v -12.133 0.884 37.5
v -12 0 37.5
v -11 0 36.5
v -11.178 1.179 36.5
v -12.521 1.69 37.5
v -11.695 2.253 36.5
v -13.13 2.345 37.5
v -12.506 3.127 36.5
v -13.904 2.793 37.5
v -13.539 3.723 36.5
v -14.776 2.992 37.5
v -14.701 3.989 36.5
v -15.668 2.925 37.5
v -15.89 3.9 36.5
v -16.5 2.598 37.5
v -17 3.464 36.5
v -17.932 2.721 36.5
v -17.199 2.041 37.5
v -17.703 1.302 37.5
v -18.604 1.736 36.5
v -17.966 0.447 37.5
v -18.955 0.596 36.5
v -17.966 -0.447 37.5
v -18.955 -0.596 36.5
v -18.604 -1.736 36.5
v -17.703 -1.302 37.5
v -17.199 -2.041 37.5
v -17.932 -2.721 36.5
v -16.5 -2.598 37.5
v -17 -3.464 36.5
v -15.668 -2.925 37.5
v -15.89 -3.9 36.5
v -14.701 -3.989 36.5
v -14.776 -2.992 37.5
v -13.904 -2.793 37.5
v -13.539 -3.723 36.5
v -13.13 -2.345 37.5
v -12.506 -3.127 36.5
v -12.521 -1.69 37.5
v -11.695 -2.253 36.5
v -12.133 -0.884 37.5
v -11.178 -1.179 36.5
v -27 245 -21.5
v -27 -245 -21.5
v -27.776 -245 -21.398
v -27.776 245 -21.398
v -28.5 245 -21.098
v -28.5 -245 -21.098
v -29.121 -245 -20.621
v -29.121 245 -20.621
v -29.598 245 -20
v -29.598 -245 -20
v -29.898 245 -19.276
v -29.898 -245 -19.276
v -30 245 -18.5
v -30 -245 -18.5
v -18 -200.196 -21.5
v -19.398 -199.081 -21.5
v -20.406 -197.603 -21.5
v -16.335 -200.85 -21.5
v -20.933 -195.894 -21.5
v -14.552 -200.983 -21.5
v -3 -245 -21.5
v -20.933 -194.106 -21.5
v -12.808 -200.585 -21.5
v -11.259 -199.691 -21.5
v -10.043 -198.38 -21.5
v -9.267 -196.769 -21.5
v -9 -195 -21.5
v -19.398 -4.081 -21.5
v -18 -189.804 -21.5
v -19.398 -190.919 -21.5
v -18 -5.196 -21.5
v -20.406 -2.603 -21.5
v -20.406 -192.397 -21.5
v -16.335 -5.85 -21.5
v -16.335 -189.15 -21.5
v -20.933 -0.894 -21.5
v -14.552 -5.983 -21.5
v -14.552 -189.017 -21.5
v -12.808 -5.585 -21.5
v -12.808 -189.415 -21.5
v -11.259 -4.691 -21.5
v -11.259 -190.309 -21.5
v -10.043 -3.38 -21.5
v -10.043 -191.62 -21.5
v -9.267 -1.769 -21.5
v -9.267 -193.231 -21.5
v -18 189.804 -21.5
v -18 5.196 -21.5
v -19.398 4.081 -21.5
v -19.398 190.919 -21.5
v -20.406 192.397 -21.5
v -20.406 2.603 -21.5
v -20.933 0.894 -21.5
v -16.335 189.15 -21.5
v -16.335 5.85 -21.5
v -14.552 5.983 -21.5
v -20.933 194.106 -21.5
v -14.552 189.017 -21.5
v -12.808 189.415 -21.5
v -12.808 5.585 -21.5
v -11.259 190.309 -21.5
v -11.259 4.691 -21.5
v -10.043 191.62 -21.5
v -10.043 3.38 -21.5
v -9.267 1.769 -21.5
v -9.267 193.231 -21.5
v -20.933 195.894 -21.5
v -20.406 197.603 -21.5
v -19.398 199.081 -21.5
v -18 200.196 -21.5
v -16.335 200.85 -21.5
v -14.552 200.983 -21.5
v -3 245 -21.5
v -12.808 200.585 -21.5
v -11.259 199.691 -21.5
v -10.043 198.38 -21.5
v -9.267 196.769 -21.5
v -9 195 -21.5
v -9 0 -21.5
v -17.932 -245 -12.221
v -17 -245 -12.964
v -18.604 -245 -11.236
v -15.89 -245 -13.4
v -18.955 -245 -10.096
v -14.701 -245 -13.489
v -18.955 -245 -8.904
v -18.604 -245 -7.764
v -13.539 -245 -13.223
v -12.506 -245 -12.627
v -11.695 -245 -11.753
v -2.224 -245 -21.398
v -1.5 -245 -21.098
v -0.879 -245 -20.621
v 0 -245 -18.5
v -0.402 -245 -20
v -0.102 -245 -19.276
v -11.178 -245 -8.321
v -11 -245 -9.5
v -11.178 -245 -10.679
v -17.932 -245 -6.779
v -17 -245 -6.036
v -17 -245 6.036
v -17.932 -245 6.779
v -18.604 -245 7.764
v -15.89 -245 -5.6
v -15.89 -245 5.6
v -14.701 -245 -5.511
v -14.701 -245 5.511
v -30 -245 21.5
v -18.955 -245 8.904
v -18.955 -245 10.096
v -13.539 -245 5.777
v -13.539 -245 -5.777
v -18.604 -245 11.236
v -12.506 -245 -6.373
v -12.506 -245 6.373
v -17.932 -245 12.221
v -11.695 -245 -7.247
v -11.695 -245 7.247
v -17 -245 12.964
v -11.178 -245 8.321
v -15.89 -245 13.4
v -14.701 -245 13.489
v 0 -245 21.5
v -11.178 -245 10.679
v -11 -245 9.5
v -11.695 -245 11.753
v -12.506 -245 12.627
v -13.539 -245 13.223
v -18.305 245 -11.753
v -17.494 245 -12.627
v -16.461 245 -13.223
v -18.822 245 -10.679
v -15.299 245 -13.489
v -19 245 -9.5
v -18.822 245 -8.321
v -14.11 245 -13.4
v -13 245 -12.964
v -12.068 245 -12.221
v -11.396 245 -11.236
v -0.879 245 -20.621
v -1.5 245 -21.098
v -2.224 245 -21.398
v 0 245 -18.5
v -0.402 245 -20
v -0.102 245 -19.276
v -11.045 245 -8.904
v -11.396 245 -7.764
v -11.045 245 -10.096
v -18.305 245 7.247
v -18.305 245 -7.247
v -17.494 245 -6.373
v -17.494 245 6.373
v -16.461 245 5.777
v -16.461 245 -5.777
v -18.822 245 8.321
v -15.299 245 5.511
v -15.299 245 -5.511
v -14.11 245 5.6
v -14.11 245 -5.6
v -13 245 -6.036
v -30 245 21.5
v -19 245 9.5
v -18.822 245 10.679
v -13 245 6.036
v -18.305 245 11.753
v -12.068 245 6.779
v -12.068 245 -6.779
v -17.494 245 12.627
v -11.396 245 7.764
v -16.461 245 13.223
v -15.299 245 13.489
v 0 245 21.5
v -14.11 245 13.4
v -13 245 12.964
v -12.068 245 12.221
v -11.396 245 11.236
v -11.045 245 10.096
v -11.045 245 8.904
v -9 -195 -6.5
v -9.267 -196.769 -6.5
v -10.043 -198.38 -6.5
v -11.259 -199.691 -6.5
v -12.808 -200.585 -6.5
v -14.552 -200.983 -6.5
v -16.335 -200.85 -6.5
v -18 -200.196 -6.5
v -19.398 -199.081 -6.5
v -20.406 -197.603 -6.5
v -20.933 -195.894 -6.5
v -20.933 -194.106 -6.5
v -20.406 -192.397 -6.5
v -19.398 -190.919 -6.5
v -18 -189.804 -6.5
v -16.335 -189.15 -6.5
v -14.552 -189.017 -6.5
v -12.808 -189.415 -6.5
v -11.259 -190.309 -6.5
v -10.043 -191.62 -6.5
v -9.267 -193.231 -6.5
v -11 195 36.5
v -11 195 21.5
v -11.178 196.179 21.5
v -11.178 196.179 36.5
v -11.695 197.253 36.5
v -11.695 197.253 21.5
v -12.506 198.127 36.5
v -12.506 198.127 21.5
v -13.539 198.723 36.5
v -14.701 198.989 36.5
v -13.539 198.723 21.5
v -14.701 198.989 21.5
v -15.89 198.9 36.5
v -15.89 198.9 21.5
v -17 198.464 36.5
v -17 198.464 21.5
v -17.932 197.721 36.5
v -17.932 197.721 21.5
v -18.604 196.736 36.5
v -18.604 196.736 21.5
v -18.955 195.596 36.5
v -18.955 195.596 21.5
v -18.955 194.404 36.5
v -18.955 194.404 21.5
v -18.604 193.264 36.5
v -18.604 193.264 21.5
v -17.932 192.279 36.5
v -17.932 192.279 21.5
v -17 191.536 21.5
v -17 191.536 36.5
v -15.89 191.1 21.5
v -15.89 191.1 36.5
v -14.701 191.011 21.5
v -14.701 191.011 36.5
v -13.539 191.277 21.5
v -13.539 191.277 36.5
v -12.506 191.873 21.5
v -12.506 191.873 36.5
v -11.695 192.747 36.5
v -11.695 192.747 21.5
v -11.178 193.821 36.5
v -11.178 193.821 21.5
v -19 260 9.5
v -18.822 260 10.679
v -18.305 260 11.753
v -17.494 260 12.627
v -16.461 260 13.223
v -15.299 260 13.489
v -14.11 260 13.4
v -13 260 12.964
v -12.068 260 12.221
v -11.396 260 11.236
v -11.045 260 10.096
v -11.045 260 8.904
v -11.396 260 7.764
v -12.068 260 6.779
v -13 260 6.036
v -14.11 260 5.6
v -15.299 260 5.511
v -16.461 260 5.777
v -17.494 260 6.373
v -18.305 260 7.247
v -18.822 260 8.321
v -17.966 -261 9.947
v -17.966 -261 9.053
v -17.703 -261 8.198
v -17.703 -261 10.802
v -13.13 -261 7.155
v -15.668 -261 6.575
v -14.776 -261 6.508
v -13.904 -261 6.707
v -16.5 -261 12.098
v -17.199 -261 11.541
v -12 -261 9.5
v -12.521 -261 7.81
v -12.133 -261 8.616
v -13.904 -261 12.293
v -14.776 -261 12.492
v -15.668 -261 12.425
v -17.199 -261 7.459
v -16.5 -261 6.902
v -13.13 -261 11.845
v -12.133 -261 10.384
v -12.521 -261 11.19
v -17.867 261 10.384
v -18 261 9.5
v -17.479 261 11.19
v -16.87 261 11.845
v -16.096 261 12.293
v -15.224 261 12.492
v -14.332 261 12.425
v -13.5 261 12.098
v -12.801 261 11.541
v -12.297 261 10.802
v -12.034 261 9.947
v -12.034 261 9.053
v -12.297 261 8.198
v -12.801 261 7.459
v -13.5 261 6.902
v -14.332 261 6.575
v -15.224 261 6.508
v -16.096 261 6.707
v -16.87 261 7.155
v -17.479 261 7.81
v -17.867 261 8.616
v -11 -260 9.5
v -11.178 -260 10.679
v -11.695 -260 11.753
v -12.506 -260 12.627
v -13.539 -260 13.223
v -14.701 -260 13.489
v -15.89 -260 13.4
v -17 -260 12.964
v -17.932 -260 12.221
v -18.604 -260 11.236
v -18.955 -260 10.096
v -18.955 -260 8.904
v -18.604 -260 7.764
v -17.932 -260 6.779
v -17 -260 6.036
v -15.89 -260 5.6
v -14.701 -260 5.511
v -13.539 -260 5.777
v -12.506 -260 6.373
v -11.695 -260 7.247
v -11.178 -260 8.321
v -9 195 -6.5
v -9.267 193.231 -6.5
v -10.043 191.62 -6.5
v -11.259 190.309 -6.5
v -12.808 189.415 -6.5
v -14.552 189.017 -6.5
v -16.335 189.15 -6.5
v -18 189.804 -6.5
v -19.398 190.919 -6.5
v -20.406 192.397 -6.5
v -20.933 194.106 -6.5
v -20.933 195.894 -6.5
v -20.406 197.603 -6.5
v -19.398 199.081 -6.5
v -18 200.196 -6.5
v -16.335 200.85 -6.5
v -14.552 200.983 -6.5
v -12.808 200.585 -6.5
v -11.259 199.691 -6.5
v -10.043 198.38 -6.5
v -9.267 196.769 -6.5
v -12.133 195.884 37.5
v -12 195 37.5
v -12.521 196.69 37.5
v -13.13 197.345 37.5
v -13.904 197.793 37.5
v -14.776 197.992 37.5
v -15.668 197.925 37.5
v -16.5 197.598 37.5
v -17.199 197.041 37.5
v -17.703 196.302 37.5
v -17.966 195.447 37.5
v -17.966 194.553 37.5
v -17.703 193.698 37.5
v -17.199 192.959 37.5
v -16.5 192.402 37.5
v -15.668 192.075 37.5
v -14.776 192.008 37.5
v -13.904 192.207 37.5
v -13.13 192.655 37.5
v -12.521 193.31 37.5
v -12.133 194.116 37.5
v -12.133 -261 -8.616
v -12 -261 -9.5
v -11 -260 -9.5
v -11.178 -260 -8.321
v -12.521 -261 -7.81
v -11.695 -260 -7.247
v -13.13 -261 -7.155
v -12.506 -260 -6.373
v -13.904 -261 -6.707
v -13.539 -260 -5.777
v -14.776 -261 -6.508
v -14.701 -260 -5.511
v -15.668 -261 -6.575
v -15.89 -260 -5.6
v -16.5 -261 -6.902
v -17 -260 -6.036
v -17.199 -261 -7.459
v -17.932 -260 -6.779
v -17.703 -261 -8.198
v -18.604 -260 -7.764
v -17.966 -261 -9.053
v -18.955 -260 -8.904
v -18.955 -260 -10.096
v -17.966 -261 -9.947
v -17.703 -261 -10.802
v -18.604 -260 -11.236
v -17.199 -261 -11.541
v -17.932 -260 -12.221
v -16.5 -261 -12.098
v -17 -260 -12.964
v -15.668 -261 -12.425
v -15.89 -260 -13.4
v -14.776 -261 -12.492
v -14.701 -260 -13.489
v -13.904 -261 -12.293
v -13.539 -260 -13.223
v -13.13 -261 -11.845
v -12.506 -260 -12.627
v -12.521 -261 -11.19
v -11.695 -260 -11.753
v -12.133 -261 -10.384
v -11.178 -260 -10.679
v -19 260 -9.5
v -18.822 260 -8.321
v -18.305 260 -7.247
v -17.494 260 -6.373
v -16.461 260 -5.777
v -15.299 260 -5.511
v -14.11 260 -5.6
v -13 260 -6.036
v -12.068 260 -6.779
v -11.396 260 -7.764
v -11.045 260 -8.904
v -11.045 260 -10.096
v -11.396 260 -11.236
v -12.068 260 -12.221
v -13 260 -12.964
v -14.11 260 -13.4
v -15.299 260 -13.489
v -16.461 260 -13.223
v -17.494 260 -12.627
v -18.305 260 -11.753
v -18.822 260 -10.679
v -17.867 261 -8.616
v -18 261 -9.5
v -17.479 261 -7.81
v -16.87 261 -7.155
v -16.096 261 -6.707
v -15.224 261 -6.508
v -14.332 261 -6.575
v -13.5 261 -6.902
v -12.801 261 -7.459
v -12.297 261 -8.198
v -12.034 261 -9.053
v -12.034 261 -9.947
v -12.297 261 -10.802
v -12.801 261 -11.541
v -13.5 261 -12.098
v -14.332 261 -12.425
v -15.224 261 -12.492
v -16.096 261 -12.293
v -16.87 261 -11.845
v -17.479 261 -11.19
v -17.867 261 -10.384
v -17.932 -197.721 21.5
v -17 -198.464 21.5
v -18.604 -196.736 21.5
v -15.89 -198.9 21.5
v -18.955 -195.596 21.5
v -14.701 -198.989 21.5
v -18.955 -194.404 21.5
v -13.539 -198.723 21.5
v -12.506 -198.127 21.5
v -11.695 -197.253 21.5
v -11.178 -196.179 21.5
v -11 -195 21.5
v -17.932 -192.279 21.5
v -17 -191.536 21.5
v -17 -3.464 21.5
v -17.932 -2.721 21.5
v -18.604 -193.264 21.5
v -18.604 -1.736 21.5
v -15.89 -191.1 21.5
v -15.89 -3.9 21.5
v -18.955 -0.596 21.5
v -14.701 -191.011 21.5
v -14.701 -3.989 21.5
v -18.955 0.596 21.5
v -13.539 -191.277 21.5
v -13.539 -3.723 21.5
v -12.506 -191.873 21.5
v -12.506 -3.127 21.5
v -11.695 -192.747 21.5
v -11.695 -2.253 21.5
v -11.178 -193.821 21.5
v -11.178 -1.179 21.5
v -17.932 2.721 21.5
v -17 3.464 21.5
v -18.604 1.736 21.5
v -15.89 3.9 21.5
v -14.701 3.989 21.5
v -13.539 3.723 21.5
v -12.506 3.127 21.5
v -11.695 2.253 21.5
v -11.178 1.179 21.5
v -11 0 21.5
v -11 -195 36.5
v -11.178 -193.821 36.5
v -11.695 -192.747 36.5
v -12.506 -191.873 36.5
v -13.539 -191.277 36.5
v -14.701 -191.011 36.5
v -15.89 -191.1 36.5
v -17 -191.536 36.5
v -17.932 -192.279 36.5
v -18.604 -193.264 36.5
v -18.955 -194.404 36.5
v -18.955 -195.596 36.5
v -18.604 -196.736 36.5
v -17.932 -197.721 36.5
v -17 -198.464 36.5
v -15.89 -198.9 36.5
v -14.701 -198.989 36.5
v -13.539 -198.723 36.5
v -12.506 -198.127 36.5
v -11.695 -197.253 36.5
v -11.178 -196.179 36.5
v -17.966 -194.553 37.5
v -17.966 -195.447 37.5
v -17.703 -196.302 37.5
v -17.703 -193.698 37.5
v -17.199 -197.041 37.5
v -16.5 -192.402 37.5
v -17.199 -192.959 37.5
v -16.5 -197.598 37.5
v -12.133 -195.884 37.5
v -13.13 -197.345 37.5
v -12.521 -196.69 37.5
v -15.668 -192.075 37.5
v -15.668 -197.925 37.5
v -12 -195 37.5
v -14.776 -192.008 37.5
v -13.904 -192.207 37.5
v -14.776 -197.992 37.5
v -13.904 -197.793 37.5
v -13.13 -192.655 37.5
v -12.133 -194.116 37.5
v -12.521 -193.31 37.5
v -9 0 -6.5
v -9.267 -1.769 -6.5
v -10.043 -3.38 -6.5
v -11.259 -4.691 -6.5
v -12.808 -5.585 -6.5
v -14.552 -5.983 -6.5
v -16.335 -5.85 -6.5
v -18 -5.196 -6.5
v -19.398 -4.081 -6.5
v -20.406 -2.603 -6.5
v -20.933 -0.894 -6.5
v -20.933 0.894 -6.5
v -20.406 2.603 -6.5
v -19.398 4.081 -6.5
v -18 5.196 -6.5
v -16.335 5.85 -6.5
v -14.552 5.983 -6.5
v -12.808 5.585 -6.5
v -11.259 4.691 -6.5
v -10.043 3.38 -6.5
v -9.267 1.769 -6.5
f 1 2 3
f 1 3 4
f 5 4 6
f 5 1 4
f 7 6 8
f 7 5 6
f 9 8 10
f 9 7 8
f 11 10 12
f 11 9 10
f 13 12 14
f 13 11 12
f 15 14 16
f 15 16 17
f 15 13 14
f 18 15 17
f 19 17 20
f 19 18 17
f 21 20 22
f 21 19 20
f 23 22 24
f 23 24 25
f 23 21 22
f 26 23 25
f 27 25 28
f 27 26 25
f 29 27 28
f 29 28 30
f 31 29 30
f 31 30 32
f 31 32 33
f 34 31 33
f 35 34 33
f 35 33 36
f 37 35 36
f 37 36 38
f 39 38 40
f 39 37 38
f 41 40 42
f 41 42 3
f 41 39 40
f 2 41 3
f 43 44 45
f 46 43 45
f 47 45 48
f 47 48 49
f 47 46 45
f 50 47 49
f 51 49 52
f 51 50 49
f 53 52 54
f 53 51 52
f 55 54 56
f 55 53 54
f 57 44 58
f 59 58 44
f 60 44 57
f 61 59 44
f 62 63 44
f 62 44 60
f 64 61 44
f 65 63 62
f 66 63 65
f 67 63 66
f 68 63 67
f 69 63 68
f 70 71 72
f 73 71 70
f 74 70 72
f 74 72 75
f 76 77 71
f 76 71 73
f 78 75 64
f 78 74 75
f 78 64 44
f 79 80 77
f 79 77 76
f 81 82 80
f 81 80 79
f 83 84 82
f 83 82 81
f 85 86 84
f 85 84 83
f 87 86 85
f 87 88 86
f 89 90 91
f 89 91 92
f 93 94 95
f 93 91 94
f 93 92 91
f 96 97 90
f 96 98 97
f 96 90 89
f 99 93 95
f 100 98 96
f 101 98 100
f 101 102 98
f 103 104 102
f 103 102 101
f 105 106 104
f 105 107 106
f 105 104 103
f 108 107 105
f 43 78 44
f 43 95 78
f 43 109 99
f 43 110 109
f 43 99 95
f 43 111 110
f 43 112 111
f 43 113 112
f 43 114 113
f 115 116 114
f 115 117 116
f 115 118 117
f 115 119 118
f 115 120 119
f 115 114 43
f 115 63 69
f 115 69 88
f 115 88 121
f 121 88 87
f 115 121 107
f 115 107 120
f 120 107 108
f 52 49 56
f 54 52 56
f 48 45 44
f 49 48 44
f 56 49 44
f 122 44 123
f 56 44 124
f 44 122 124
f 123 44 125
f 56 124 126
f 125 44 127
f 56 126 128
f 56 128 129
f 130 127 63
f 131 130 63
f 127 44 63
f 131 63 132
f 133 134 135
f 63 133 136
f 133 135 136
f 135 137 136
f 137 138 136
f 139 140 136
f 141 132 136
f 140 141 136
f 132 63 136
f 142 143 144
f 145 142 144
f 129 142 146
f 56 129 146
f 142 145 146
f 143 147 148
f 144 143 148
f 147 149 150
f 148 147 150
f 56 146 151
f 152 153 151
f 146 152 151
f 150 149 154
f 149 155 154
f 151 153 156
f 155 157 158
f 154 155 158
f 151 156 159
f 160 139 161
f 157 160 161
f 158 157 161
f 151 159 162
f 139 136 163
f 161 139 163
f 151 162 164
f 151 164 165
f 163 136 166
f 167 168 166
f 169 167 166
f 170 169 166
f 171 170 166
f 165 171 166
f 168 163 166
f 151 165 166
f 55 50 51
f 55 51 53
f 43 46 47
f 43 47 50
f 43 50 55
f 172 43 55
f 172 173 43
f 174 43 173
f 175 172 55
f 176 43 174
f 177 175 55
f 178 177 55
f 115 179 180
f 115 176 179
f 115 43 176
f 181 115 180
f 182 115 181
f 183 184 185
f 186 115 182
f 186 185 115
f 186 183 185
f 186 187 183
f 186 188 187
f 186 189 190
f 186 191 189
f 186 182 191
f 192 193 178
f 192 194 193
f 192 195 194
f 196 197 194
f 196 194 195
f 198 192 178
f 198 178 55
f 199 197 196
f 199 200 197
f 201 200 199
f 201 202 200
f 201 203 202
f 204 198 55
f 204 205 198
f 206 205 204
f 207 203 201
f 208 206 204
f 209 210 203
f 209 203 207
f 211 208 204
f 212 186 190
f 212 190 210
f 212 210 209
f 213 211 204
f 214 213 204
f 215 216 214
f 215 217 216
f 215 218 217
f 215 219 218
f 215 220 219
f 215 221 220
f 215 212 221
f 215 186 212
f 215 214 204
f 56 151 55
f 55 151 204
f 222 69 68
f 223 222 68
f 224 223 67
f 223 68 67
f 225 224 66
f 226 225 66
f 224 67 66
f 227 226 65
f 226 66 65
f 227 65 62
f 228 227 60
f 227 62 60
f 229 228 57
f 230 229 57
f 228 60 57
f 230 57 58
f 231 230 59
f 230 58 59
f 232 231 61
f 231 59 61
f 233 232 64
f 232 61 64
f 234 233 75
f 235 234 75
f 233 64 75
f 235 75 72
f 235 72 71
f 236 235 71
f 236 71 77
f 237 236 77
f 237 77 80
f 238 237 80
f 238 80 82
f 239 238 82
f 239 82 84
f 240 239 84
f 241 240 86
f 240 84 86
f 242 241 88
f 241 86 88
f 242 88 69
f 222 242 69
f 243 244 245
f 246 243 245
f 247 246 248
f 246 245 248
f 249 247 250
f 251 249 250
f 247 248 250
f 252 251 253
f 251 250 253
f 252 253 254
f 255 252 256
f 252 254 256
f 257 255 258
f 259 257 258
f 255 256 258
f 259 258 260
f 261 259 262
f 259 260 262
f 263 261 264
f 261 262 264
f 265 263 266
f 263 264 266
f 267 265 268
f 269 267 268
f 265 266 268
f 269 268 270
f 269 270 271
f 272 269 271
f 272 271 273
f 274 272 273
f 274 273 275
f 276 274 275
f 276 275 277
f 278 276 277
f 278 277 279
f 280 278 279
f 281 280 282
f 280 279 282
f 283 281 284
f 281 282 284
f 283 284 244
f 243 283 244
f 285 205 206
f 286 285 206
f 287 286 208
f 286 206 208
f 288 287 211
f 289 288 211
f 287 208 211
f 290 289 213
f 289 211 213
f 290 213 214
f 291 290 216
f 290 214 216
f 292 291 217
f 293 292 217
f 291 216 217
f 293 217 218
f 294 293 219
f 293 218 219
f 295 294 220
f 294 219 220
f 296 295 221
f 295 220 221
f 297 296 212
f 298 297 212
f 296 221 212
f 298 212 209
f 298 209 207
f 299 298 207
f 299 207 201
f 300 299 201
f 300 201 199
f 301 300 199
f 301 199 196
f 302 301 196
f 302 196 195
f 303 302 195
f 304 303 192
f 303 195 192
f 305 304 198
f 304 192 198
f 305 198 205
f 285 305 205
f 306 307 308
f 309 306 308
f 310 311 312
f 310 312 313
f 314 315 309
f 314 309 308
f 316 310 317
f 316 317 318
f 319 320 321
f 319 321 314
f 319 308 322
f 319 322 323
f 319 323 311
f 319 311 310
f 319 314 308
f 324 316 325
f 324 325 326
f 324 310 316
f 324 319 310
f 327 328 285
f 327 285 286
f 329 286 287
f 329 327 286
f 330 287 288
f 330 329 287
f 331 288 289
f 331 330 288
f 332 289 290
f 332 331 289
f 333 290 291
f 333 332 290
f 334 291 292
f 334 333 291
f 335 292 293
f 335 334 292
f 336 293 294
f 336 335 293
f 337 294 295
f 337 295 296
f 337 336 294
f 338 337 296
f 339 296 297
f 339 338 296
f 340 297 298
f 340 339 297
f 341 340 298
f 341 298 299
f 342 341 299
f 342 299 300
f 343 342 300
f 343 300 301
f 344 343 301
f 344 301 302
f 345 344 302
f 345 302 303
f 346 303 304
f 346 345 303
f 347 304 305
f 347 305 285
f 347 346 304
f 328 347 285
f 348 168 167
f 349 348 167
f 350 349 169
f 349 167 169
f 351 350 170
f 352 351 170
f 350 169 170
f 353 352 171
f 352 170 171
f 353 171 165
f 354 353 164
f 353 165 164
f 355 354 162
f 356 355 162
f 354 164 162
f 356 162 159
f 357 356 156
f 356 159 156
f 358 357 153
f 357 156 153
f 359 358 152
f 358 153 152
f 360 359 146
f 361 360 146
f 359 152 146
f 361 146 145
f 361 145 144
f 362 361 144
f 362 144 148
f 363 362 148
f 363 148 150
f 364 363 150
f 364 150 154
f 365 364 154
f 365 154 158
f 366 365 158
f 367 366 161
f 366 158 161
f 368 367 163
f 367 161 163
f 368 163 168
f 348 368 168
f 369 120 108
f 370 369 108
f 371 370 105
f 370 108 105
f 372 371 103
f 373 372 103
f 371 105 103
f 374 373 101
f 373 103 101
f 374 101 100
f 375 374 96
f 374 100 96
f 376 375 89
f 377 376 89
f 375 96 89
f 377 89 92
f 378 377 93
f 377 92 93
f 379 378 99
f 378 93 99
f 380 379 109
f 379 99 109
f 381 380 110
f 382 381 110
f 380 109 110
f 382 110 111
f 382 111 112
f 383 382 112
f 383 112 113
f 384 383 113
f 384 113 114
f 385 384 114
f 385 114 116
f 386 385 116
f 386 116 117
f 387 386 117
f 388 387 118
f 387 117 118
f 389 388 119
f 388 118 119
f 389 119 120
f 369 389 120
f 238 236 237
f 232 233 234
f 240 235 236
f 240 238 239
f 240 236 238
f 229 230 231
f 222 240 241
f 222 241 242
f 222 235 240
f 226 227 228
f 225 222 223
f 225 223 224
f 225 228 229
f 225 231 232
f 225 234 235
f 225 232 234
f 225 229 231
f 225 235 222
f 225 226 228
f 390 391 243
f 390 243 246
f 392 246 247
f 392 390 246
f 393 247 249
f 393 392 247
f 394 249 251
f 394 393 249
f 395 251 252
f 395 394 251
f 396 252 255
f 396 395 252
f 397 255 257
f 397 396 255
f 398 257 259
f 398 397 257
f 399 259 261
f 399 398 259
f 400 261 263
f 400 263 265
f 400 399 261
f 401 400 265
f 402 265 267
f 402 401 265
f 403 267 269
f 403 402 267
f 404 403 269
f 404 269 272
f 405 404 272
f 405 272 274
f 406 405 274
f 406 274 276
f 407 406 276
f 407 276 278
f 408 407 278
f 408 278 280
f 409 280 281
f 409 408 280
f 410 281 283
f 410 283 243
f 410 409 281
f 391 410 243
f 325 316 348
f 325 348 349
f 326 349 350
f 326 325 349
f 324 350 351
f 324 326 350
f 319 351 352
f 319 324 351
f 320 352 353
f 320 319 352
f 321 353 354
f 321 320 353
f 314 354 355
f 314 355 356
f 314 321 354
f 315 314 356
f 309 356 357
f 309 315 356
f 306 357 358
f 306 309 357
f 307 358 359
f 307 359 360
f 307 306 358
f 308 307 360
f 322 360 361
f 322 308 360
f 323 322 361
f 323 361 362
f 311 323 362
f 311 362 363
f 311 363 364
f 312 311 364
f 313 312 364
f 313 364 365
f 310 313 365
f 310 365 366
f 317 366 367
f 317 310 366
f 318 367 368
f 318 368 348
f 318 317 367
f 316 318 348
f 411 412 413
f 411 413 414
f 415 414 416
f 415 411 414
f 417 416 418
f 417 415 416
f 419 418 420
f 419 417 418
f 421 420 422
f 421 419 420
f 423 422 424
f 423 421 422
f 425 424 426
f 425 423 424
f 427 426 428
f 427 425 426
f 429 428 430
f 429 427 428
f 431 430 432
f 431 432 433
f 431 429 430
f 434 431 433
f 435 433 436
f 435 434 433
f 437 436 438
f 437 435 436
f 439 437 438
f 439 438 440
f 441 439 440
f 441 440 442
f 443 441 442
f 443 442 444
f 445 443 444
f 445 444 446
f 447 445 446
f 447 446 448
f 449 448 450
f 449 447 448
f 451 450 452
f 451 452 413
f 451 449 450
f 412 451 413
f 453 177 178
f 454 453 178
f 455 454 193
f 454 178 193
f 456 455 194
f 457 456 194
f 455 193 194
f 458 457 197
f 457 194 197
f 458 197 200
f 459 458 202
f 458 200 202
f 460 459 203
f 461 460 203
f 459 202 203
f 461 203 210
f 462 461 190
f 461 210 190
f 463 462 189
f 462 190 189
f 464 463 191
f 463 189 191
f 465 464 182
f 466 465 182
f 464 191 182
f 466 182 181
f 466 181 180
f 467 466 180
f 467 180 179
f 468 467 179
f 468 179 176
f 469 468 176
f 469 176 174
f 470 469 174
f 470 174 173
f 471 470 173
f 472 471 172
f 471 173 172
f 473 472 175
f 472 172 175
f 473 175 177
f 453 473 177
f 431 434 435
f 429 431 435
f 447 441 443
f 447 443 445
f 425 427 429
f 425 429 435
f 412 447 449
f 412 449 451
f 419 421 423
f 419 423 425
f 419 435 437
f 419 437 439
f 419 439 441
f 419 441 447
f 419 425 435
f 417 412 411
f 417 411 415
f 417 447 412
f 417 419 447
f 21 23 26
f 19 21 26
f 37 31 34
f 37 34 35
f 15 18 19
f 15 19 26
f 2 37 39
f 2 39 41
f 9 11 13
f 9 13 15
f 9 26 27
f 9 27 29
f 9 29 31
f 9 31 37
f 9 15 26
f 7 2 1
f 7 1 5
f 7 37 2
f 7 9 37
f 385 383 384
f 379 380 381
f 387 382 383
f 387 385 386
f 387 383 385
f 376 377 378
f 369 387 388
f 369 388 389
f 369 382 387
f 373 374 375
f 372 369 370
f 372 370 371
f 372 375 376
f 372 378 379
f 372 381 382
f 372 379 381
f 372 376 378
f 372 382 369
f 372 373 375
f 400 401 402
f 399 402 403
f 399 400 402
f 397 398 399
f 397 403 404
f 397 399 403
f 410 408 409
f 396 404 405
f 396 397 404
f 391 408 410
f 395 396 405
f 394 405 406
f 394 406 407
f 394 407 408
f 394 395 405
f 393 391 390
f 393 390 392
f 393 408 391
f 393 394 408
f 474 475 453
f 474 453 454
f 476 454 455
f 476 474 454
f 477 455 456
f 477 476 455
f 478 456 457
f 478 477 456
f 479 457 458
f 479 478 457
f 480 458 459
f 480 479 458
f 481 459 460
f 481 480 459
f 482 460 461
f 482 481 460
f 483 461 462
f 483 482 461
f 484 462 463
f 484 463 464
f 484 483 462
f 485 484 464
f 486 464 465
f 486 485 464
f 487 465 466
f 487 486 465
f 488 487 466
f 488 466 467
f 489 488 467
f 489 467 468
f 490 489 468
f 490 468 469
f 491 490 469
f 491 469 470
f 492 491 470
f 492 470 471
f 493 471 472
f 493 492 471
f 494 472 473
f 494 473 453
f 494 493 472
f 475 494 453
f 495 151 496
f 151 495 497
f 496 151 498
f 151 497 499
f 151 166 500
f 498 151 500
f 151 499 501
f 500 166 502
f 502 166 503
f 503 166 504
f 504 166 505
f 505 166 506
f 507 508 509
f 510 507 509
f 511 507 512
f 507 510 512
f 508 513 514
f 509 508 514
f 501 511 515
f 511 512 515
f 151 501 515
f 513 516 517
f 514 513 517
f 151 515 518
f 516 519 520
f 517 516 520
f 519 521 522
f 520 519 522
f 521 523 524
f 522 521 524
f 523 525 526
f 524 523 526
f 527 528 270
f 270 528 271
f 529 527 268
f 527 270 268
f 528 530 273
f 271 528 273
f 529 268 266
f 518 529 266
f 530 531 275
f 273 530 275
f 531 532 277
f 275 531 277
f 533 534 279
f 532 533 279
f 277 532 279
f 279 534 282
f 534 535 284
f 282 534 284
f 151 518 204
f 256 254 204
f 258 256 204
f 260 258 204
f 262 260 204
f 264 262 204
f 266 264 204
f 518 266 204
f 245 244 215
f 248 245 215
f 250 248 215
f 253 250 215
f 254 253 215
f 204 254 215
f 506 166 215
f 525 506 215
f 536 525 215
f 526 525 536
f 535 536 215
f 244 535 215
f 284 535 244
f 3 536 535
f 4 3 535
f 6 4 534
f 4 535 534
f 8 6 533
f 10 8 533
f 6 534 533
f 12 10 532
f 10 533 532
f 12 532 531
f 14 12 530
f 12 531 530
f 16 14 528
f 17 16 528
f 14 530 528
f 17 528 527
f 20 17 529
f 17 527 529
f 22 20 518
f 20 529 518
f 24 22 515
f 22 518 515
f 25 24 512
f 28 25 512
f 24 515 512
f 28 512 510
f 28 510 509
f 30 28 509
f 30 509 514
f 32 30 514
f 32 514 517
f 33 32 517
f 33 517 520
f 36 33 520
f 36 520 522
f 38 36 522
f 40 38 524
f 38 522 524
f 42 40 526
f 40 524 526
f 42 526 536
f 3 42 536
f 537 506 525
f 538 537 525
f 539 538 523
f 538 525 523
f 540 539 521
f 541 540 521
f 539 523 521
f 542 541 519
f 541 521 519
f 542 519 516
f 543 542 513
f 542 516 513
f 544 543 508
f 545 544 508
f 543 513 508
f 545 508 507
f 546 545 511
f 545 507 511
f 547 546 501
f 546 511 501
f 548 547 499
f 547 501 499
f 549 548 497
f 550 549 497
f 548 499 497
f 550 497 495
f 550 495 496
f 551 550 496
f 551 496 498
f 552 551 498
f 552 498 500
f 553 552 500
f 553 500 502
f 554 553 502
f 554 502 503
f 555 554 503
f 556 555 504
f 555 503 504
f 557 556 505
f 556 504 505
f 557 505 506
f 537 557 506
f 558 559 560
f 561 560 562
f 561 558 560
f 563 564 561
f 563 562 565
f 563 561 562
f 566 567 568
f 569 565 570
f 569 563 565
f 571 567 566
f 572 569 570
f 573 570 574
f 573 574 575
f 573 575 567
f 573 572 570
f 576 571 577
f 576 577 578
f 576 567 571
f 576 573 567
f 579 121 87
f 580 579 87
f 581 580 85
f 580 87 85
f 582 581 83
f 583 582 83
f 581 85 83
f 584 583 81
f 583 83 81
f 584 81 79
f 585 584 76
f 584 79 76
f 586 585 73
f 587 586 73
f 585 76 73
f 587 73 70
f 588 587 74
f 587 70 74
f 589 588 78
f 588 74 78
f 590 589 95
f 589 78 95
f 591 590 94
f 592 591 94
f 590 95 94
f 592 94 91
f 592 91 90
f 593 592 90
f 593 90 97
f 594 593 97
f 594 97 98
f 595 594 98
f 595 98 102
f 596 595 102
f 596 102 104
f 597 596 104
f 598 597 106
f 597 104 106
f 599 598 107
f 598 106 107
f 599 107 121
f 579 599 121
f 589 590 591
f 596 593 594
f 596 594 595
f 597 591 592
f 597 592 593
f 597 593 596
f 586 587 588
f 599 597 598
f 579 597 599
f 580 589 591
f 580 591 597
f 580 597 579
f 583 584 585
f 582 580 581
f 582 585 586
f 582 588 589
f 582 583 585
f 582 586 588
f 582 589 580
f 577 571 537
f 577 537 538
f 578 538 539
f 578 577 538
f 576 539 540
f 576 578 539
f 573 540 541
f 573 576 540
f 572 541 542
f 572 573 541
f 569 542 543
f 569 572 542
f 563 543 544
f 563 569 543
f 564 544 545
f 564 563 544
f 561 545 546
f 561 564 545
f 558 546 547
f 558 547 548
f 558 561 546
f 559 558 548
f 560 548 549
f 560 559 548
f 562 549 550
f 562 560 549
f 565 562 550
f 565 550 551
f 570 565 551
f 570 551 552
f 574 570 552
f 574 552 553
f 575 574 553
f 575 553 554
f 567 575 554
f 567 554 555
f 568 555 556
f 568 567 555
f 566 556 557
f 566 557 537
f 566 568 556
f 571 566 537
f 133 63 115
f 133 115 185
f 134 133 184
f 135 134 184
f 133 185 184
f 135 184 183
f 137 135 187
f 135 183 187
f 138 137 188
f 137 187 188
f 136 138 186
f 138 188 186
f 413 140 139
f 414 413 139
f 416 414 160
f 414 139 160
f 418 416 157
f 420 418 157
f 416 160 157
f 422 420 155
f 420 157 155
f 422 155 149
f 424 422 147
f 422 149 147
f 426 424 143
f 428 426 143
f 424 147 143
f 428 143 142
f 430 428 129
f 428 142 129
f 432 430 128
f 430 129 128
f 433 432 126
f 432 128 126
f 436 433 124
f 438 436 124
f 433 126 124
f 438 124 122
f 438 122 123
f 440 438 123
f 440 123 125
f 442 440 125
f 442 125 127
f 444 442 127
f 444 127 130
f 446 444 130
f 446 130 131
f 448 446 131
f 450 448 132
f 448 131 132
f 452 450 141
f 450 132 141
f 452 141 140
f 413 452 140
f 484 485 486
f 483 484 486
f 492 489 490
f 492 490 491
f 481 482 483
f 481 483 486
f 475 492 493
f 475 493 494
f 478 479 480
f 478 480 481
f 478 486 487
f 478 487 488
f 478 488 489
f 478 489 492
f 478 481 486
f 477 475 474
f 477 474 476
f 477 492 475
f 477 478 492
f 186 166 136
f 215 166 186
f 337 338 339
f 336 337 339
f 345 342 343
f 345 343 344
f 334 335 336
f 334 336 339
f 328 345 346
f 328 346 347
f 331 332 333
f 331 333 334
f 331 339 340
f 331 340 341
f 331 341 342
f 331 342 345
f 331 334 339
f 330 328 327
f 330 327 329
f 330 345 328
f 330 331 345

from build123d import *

# Parameters (mm, degrees)
F0_W      = 490
F0_H      = 43
F1_DEPTH  = 30
F2_R      = 4
F3_DEPTH  = 16
F4_SIZE   = 1
F5_R      = 4
F6_DEPTH  = 16
F7_SIZE   = 1
F8_R      = 3
F9_R      = 6
F10_DEPTH = 15
F11_R     = 4
F12_DEPTH = 16
F13_SIZE  = 1


with BuildPart() as f1:
    # F0 (on Right) → F1 (new body)
    with BuildSketch(Plane.YZ):
        Rectangle(F0_W, F0_H)
    extrude(amount=-F1_DEPTH)

    # F2 (on face) → F3 (join)
    with BuildSketch(Plane(origin=(0, 245, 0), x_dir=(-1, 0, 0), z_dir=(0, 1, 0))):
        with Locations((15, 9.5)):
            Circle(F2_R)
        with Locations((15, -9.5)):
            Circle(F2_R)
    extrude(amount=F3_DEPTH)

    # F4
    f4_edges = [f1.edges().sort_by_distance(p)[0] for p in [
        (-11, 261, 9.5),
        (-11, 261, -9.5),
    ]]
    chamfer(f4_edges, length=F4_SIZE)

    # F5 (on face) → F6 (join)
    with BuildSketch(Plane.XZ.offset(245)):
        with Locations((-15, 9.5)):
            Circle(F5_R)
        with Locations((-15, -9.5)):
            Circle(F5_R)
    extrude(amount=F6_DEPTH)

    # F7
    f7_edges = [f1.edges().sort_by_distance(p)[0] for p in [
        (-19, -261, 9.5),
        (-19, -261, -9.5),
    ]]
    chamfer(f7_edges, length=F7_SIZE)

    # F8
    f8_edges = [f1.edges().sort_by_distance(p)[0] for p in [
        (-30, 0, -21.5),
        (0, 0, -21.5),
    ]]
    fillet(f8_edges, radius=F8_R)

    # F9 (on face) → F10 (cut)
    with BuildSketch(Plane(origin=(0, 0, -21.5), x_dir=(1, 0, 0), z_dir=(0, 0, -1))):
        with Locations((-15, 195)):
            Circle(F9_R)
        with Locations((-15, 0)):
            Circle(F9_R)
        with Locations((-15, -195)):
            Circle(F9_R)
    extrude(amount=-F10_DEPTH, mode=Mode.SUBTRACT)

    # F11 (on face) → F12 (join)
    with BuildSketch(Plane.XY.offset(21.5)):
        with Locations((-15, 195)):
            Circle(F11_R)
        with Locations((-15, 0)):
            Circle(F11_R)
        with Locations((-15, -195)):
            Circle(F11_R)
    extrude(amount=F12_DEPTH)

    # F13
    f13_edges = [f1.edges().sort_by_distance(p)[0] for p in [
        (-19, 195, 37.5),
        (-19, 0, 37.5),
        (-19, -195, 37.5),
    ]]
    chamfer(f13_edges, length=F13_SIZE)


solid = f1.part
